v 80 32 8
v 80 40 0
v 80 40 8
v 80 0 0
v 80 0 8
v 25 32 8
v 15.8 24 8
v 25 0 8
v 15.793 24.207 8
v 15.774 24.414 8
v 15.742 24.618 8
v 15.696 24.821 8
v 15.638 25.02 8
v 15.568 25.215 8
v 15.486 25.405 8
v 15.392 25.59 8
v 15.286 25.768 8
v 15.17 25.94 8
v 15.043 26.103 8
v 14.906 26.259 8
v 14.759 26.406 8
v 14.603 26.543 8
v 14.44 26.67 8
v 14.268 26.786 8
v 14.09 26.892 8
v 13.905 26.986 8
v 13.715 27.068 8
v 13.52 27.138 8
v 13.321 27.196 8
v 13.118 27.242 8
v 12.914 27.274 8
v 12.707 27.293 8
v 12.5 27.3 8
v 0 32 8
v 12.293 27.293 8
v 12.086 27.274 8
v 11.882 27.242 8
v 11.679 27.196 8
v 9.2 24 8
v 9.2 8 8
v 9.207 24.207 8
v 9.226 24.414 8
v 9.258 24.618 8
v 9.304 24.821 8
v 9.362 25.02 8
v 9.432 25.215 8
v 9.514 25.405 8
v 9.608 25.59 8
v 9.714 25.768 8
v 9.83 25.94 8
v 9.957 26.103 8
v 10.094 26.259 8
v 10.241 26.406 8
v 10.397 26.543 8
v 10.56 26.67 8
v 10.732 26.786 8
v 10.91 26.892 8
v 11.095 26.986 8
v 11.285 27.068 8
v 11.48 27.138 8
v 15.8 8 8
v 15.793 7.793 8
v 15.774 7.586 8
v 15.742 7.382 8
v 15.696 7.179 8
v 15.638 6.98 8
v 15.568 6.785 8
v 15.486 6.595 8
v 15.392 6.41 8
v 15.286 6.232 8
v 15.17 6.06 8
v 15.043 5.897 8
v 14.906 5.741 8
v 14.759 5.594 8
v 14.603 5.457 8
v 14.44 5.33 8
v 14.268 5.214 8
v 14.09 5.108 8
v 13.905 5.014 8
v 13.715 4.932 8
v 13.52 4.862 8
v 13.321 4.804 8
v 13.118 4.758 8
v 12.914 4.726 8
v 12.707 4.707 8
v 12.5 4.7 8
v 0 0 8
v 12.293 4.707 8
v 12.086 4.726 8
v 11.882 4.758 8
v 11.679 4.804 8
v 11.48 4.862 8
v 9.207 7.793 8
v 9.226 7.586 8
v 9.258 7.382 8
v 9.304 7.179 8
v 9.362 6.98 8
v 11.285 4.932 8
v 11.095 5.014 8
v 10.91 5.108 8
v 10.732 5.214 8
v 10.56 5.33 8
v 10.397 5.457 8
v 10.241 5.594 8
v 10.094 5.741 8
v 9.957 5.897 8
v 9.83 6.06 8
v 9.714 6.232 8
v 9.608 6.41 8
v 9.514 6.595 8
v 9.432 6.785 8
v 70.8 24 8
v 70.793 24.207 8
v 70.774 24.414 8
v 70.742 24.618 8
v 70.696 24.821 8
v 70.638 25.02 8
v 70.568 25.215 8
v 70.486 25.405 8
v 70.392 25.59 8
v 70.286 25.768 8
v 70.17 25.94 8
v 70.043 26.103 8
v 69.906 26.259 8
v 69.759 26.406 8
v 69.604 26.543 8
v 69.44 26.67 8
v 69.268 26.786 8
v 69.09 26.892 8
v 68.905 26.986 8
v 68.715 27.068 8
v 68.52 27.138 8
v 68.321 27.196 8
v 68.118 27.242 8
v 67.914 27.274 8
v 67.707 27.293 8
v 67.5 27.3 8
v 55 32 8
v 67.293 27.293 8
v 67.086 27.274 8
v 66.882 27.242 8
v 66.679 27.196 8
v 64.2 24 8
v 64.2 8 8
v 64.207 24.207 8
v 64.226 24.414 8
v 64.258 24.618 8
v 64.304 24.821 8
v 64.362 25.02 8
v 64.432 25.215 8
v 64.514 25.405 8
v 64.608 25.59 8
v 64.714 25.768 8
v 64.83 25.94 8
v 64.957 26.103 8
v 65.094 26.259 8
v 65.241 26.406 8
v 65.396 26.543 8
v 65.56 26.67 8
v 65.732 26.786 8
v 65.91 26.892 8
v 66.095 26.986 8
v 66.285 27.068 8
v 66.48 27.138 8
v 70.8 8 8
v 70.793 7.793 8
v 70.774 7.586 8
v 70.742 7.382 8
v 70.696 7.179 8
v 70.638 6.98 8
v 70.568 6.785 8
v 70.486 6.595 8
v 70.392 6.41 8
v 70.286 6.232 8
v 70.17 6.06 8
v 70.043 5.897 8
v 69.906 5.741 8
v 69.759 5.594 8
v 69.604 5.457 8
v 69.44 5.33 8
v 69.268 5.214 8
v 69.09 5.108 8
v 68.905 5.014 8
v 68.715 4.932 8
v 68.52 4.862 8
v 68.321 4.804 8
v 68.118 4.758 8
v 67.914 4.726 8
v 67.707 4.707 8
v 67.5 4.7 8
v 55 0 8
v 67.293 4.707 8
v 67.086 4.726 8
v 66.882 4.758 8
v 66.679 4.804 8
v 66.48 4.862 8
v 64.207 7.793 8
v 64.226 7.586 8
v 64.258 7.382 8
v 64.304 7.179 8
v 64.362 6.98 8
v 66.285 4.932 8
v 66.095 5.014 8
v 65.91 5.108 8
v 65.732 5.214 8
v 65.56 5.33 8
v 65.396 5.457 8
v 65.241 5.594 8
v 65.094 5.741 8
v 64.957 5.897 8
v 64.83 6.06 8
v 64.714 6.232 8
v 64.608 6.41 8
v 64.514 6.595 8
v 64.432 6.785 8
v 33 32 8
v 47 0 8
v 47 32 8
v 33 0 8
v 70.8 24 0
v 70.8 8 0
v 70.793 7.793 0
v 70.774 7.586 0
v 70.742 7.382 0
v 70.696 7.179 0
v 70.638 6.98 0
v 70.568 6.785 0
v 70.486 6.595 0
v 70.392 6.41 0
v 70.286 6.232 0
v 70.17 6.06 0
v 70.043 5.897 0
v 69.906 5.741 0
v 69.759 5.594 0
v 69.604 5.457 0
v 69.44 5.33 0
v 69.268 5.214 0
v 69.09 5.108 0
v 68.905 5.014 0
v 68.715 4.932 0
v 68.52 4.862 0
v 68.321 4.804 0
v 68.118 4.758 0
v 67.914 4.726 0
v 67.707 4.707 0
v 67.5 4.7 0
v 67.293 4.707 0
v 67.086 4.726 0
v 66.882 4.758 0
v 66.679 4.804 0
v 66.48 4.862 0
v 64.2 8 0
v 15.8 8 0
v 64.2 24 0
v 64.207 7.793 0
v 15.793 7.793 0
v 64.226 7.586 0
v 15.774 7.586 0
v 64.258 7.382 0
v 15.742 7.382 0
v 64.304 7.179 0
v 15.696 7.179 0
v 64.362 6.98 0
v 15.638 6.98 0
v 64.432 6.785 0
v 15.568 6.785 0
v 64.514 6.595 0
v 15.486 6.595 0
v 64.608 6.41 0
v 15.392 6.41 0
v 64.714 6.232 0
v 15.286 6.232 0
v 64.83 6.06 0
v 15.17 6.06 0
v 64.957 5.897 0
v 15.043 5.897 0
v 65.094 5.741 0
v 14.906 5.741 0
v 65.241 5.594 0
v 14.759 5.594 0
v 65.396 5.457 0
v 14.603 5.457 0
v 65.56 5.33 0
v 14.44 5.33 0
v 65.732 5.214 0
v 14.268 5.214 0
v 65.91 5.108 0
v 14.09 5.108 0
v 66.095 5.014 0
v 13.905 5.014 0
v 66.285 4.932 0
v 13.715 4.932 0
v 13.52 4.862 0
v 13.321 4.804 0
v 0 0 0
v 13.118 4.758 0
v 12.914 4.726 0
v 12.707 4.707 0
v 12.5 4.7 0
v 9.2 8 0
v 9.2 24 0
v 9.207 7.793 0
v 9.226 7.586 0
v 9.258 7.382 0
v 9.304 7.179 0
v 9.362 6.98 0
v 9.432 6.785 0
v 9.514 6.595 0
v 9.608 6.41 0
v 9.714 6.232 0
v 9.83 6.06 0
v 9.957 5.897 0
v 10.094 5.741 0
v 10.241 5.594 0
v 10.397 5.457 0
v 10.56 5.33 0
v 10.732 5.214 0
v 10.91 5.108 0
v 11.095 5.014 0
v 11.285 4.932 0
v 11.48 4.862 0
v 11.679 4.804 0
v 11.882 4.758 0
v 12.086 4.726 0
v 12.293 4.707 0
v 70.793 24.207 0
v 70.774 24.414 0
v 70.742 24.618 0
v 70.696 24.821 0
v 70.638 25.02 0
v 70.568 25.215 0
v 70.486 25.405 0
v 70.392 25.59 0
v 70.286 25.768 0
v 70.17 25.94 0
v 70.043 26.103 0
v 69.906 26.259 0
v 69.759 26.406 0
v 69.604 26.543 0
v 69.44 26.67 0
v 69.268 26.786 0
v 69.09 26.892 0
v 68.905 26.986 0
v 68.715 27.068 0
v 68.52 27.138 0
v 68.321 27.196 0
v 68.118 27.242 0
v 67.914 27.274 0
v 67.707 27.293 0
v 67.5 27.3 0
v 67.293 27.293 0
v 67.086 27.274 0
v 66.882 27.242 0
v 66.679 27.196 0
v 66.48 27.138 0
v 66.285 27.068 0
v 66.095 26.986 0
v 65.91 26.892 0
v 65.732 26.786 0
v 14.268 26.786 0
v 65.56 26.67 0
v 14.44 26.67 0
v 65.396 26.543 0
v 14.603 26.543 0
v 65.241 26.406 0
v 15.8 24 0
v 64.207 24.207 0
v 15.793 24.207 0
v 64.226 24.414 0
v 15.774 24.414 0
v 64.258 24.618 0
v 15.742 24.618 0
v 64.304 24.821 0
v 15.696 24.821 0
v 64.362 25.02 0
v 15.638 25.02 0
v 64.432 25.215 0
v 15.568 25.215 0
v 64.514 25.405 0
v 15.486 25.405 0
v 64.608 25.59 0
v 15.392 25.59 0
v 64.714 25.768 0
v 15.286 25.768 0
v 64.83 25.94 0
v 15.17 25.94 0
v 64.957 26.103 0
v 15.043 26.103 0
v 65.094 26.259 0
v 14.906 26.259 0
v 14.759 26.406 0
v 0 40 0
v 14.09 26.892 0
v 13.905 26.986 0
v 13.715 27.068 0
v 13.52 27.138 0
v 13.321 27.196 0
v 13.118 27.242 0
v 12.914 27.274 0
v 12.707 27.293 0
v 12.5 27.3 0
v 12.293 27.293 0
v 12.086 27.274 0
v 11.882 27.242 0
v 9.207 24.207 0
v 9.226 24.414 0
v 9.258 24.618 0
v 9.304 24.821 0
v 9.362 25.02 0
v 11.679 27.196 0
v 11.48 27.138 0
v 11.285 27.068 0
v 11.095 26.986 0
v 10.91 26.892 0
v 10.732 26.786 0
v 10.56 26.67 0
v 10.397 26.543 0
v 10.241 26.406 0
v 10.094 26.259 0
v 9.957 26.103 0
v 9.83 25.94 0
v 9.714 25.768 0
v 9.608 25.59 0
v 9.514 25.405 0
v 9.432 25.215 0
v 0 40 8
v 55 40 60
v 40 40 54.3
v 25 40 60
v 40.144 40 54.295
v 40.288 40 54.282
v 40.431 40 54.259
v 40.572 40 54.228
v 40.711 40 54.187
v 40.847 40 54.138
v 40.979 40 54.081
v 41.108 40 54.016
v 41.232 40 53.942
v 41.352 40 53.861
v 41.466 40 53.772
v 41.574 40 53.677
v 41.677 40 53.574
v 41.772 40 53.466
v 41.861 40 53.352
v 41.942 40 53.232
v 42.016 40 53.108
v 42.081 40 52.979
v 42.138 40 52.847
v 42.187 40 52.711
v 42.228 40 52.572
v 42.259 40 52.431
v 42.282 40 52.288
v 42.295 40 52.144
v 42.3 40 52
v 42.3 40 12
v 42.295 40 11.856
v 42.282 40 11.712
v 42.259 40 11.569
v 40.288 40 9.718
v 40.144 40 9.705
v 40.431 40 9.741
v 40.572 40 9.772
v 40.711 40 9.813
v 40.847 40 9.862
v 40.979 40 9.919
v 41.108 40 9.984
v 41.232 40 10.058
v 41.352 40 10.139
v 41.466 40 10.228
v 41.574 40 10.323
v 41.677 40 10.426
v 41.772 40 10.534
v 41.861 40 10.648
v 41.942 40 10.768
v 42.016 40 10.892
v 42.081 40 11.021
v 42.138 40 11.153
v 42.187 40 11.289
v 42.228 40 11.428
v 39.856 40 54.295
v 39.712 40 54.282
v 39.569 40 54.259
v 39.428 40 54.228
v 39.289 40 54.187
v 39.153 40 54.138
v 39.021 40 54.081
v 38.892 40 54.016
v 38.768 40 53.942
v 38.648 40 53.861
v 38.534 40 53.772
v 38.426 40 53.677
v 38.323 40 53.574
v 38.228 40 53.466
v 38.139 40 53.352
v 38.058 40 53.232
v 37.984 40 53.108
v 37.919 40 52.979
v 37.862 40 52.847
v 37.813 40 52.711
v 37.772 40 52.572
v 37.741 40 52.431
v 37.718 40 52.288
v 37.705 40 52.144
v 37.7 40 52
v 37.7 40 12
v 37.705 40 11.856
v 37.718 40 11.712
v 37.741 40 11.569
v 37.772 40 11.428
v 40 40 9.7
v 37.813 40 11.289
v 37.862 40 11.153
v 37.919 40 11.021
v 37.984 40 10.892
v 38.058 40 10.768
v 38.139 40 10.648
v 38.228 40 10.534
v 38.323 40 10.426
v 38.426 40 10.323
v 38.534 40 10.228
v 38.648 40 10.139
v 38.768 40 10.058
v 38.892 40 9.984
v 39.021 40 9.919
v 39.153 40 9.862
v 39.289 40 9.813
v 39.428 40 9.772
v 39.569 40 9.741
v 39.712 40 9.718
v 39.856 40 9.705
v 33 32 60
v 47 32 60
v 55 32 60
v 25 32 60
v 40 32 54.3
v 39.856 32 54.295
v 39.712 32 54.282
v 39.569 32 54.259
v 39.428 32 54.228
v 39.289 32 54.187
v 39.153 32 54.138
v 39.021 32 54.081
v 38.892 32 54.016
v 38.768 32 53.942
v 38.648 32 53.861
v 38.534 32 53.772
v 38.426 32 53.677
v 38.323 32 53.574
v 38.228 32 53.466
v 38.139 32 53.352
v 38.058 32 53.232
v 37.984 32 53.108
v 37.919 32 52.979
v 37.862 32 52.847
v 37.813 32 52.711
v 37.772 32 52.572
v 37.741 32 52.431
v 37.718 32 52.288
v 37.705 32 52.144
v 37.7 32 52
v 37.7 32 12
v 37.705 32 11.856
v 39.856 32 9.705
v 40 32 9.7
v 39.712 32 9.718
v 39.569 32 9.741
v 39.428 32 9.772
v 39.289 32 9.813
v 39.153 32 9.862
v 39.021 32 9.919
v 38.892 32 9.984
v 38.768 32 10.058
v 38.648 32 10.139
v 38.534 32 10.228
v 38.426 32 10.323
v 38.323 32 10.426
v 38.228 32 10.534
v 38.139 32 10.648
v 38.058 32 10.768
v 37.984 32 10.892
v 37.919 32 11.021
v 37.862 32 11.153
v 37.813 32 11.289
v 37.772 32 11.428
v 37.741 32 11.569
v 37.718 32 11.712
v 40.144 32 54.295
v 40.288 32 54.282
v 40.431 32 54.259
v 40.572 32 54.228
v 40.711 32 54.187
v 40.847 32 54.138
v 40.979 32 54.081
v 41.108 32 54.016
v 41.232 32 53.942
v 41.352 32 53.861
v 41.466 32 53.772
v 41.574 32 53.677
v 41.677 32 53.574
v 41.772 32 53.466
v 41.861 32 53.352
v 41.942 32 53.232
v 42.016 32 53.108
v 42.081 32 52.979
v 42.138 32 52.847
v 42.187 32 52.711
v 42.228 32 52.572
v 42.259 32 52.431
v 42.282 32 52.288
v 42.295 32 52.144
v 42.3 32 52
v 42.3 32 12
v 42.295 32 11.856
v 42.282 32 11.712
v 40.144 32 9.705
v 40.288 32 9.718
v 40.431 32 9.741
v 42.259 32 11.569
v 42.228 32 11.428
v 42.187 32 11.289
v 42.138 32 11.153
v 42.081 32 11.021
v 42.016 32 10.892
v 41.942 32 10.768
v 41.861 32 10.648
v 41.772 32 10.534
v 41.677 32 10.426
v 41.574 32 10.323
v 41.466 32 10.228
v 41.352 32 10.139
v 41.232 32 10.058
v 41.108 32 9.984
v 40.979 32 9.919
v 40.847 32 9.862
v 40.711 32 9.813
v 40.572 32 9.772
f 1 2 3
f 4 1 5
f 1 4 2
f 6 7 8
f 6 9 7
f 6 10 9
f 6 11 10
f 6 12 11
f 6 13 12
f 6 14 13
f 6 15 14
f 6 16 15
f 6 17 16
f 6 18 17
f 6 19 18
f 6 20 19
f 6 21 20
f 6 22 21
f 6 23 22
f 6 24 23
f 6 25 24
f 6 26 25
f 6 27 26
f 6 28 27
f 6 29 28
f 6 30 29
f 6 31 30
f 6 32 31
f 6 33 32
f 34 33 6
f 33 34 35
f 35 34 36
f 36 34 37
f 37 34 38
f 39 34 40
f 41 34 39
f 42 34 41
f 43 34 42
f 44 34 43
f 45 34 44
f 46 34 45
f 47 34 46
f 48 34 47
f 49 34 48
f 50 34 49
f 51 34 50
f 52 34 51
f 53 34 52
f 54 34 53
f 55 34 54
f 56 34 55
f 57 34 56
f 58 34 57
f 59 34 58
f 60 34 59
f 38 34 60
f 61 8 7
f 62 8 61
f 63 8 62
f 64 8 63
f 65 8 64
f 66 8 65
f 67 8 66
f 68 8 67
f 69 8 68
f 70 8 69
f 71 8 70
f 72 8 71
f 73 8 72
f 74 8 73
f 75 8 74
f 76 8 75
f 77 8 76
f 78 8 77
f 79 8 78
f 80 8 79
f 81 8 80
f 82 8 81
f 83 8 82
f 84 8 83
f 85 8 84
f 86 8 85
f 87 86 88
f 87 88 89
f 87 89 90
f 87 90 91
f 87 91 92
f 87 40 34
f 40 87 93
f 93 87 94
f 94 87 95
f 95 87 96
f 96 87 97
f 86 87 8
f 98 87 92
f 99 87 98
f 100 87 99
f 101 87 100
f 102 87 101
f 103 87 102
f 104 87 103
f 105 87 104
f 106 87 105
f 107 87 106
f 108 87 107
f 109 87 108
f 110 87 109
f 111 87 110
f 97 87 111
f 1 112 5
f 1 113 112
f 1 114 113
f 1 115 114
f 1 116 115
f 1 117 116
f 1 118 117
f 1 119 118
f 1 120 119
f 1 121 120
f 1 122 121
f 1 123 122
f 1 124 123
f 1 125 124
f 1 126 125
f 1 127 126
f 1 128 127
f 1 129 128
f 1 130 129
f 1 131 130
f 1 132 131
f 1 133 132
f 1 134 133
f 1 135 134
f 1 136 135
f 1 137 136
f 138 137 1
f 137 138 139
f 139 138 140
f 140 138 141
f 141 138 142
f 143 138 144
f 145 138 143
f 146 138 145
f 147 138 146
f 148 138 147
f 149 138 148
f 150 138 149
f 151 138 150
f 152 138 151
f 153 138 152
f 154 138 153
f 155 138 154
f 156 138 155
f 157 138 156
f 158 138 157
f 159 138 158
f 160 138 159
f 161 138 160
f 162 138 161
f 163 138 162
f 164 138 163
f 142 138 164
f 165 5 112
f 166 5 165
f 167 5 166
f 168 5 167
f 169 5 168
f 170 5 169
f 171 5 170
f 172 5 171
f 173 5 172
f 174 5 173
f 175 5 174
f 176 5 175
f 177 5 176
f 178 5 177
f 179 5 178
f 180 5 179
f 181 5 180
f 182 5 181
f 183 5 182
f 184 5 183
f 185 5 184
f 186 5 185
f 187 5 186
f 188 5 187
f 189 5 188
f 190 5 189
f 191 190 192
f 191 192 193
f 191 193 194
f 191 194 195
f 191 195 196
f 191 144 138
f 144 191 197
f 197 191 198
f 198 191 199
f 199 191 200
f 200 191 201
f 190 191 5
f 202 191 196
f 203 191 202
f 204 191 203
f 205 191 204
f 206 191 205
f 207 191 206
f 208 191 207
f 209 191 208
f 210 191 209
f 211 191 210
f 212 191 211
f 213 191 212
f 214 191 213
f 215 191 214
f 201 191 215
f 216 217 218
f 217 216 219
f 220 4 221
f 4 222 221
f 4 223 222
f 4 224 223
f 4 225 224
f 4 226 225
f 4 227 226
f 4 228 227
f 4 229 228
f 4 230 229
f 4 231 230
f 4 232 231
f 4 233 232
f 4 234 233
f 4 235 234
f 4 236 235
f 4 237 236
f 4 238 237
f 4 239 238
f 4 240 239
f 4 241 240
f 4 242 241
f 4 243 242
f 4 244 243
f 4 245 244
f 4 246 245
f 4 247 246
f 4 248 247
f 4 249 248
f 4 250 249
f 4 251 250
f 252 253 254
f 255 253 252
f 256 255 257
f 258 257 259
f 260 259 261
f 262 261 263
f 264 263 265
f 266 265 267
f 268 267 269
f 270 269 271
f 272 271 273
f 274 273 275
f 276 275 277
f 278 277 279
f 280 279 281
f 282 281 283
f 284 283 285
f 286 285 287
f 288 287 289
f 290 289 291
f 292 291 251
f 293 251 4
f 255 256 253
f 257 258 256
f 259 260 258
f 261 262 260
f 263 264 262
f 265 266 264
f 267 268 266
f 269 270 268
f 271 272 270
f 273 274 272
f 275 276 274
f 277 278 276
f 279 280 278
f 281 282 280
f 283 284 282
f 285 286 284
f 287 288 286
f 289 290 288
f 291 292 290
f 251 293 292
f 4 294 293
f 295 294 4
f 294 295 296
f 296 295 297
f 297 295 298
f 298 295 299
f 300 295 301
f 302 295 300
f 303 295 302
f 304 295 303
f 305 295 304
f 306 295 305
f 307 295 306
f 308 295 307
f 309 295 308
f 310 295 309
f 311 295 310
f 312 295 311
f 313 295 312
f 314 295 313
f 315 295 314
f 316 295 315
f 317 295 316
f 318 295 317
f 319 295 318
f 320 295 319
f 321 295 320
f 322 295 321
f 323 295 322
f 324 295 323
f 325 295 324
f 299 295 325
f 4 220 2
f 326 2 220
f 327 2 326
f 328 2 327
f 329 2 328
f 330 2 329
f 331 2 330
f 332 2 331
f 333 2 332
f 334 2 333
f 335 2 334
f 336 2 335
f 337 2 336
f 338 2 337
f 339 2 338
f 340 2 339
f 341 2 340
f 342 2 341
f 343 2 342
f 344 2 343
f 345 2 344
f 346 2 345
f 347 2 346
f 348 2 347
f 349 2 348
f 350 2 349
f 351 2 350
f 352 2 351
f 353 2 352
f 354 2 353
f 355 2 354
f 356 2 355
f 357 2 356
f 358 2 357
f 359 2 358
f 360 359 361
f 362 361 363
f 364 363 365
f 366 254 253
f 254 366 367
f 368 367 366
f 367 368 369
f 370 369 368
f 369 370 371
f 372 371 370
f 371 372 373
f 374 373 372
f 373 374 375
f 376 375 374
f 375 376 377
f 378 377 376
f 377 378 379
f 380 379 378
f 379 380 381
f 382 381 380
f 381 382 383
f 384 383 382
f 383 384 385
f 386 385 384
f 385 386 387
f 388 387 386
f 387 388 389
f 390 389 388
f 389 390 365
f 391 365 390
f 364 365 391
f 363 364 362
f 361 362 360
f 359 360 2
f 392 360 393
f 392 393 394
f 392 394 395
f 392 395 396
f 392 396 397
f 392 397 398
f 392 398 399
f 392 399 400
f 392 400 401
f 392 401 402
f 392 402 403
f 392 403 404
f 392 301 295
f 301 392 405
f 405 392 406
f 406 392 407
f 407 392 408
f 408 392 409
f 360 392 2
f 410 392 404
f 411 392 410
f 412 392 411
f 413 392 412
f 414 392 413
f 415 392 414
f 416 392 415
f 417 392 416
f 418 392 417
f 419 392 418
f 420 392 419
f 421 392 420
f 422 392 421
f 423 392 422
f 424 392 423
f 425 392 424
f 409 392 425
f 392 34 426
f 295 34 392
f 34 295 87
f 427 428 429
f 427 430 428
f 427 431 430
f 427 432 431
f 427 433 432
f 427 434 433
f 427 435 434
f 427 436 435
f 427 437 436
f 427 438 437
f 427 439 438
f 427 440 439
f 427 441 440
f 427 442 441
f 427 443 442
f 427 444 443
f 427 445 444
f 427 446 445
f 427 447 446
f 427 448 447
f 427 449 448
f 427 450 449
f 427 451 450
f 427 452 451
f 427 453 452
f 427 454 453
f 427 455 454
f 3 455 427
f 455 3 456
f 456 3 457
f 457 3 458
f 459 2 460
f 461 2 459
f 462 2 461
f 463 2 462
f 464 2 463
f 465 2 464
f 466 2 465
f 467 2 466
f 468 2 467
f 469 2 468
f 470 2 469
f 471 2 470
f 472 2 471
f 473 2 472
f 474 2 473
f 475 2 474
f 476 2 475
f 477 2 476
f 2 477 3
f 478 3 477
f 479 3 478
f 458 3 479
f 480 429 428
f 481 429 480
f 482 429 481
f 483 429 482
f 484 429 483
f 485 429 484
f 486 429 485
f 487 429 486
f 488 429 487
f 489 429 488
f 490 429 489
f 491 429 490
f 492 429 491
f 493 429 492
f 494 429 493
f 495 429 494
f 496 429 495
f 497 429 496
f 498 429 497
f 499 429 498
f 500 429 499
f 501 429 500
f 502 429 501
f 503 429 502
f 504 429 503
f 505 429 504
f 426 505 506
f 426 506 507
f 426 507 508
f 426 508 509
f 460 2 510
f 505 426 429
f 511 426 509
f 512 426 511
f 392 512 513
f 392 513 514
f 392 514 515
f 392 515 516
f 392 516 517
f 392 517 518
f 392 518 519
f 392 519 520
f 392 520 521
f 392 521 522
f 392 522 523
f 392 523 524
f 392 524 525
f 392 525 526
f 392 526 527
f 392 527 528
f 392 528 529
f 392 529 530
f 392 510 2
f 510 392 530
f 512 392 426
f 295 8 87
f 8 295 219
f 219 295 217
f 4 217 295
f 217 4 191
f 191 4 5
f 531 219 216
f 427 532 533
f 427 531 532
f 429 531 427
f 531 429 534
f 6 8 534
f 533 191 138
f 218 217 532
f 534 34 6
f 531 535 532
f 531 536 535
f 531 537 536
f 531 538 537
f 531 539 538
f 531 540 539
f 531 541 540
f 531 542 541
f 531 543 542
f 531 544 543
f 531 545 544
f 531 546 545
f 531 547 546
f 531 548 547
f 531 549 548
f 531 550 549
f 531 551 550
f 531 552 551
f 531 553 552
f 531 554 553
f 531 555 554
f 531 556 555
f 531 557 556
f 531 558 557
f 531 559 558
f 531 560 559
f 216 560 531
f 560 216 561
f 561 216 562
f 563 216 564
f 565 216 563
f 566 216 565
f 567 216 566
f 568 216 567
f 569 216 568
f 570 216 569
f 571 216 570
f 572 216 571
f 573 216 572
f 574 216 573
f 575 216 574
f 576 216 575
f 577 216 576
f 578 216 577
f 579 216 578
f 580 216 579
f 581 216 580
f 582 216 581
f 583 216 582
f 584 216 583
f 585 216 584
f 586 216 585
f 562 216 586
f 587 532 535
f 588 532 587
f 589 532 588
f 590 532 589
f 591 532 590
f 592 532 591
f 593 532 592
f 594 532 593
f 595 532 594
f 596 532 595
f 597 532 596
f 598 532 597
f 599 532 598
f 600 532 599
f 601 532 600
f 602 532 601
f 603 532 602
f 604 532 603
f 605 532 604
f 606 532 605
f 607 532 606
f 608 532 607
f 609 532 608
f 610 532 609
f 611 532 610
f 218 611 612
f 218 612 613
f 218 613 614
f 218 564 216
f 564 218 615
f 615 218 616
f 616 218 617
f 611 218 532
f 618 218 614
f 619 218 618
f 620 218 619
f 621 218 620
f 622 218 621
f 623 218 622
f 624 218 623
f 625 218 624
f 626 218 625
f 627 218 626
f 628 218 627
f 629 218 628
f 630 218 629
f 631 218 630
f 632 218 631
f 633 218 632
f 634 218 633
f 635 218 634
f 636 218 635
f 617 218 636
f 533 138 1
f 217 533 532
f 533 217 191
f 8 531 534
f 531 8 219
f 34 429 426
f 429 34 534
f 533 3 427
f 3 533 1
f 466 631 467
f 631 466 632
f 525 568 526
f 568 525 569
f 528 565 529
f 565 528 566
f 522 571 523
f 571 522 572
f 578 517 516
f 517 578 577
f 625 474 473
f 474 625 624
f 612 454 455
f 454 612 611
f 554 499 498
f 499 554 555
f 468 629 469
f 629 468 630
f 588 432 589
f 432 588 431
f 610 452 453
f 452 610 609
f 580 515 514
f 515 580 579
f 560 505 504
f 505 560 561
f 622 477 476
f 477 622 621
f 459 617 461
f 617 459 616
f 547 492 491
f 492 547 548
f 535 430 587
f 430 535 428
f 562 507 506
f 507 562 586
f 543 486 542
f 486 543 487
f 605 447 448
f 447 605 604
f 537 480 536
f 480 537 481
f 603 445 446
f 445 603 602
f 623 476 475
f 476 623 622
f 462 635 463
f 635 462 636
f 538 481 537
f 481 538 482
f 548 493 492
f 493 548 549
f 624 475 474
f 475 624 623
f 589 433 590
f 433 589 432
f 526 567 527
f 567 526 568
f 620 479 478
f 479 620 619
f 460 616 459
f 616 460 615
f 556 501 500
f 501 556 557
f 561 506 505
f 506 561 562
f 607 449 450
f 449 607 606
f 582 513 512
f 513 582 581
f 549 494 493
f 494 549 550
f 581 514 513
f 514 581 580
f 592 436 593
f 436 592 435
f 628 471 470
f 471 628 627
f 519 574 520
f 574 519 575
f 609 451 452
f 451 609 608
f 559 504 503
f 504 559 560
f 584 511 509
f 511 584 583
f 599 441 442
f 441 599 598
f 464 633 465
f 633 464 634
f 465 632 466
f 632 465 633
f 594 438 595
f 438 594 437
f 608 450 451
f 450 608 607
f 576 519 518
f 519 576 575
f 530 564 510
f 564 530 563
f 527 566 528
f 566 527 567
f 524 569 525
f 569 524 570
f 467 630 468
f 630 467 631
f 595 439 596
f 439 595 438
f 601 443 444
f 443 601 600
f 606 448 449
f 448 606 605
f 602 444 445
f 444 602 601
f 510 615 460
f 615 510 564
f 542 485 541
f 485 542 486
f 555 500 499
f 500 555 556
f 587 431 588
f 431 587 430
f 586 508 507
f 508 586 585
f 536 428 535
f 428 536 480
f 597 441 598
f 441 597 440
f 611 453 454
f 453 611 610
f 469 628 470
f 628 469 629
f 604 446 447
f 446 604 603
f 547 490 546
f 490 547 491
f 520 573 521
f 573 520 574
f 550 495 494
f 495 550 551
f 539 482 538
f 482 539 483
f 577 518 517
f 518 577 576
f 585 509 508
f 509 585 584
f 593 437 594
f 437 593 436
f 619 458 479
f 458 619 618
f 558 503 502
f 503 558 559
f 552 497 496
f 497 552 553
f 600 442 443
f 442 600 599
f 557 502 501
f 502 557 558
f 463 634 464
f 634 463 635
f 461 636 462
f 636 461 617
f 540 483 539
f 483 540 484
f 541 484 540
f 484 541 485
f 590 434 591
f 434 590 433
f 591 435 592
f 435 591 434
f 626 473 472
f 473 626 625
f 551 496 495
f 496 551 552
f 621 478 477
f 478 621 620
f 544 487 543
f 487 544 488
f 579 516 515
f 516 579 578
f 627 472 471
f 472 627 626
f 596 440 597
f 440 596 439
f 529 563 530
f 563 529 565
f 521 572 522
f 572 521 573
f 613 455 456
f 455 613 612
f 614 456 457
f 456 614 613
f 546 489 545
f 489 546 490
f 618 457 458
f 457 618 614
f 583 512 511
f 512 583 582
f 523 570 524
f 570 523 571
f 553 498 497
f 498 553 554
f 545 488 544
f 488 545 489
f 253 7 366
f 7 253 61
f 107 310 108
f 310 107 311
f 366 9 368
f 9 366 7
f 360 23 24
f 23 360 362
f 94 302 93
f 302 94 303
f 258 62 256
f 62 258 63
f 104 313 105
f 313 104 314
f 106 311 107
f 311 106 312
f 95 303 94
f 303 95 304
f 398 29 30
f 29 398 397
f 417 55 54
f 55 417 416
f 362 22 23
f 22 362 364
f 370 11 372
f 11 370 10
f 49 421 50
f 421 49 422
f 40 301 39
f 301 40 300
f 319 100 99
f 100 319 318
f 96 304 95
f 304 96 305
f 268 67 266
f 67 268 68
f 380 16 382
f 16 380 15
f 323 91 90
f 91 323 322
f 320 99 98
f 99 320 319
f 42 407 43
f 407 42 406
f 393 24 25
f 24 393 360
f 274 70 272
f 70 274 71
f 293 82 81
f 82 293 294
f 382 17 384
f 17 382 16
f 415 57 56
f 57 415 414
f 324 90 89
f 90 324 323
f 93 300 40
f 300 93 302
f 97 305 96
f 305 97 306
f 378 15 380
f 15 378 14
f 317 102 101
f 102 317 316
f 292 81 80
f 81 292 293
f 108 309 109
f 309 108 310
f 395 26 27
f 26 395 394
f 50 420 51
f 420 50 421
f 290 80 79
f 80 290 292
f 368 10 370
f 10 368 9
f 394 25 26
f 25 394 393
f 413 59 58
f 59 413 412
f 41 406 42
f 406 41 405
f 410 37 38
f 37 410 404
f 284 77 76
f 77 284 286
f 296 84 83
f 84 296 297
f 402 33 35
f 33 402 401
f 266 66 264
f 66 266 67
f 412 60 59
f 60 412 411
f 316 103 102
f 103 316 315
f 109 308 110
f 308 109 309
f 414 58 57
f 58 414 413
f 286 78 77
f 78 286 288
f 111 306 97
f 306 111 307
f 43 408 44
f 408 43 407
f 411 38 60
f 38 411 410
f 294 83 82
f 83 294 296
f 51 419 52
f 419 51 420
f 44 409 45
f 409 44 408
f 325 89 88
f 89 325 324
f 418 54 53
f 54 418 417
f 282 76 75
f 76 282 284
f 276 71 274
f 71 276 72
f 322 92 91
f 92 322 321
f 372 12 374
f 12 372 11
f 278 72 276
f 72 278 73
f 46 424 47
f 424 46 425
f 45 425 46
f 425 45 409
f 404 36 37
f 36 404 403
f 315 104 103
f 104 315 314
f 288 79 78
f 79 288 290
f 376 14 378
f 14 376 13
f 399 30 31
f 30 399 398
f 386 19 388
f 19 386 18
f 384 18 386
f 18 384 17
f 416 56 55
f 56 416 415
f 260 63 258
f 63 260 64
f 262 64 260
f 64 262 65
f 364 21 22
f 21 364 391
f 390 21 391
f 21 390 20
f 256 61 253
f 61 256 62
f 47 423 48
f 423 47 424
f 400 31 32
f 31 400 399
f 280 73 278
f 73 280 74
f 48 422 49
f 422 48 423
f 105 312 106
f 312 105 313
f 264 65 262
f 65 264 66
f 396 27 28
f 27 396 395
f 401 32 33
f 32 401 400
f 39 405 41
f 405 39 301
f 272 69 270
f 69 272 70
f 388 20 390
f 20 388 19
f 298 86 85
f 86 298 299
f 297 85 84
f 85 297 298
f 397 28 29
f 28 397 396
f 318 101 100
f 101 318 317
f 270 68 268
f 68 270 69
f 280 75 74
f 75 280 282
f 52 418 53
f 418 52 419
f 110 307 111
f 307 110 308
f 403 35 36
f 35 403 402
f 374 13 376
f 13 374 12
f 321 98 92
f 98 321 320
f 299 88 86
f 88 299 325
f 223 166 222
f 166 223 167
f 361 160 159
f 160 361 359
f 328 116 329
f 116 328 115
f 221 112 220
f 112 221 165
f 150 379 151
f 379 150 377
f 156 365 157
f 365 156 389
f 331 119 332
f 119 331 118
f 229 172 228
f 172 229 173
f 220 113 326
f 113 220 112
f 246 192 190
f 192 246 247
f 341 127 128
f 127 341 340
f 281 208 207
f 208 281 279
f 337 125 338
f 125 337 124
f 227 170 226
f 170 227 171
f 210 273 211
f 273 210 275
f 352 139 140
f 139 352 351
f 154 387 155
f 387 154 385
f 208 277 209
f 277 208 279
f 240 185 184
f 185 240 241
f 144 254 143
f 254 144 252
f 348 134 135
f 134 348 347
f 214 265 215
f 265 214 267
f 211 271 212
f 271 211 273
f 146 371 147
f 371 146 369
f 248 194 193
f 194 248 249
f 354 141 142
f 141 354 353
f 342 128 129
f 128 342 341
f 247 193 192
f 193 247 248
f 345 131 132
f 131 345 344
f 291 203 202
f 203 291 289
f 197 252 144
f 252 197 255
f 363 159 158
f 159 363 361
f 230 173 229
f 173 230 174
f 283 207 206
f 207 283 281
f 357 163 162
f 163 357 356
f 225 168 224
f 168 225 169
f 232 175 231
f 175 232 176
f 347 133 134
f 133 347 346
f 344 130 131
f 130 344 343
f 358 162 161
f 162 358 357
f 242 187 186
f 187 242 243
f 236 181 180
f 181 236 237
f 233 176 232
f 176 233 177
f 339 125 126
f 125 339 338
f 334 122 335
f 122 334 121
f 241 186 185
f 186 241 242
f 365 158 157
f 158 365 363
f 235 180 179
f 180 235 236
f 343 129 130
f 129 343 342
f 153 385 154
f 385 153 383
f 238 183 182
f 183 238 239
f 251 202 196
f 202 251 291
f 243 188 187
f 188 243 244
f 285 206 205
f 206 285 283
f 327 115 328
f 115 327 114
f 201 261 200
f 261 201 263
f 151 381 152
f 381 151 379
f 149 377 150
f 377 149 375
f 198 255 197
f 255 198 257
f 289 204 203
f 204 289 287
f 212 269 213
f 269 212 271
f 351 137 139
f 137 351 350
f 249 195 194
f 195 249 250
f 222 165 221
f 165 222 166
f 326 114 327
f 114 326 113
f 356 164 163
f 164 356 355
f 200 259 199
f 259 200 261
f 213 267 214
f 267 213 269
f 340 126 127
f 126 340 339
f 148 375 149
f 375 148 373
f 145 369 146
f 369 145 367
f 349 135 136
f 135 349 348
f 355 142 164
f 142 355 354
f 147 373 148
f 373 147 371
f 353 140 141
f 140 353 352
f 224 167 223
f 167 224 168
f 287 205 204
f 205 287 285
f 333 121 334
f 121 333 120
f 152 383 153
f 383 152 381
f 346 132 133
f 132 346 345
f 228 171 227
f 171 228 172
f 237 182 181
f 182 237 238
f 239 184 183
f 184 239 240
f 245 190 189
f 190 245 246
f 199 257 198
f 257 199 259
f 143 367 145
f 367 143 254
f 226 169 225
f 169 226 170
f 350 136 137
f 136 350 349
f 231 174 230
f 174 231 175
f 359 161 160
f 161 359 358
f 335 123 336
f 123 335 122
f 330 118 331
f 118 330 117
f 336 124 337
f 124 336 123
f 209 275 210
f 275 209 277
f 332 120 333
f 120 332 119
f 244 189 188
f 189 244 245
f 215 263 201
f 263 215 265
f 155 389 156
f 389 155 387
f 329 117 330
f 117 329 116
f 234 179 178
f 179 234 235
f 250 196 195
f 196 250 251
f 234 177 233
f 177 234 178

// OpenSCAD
$fn=100;

loose_slack = 0.3;
tight_slack = 0.1;

mat_width = 30;
mat_thickness = 5;
mat_fixation_hole_diameter = 4;
mat_base_fixation_hole_diameter = 6;

mat_holder_thickness = 8;
mat_holder_width = 80;
mat_holder_depth = 40;
mat_holder_height = 60;

module mat_holder_base() {
    cube([mat_holder_width, mat_holder_depth, mat_holder_thickness]);
    
    translate([mat_holder_width/2 - mat_width/2, 0, 0])
        cube([mat_holder_thickness, mat_holder_depth, mat_holder_height]);
    translate([mat_holder_width/2 + mat_width/2 - mat_holder_thickness, 0, 0])
        cube([mat_holder_thickness, mat_holder_depth, mat_holder_height]);
    
    translate([0, mat_holder_depth - mat_holder_thickness, 0])
        cube([mat_holder_width, mat_holder_thickness, mat_holder_height]);
}

module negative_side_profile() {
    rotate([90, 0, 0])
    rotate([0, 90, 0])
        linear_extrude(height = mat_holder_width + 2)
            polygon(points=[[0, mat_holder_thickness], [mat_holder_depth - mat_holder_thickness, mat_holder_height], [mat_holder_depth - mat_holder_thickness, mat_holder_height + 1], [-1, mat_holder_height + 1], [-1, mat_holder_thickness]]);
}

module negative_front_profile() {
    mirror([0,1,0])
        rotate([90, 0, 0])
            linear_extrude(height = mat_holder_depth + 2)
                polygon(points=[[0, mat_holder_thickness], [mat_holder_width/2 - mat_width/2, mat_holder_height], [mat_holder_width/2 - mat_width/2, mat_holder_height + 1], [-1, mat_holder_height + 1], [-1, mat_holder_thickness]]);
}

module base_fixation_holes() {
    hull() {
        translate([0, mat_holder_thickness, -1])
            cylinder(d=mat_base_fixation_hole_diameter + 2*loose_slack, h=mat_holder_thickness+2);
            
        translate([0, mat_holder_depth - 2*mat_holder_thickness, -1])
            cylinder(d=mat_base_fixation_hole_diameter + 2*loose_slack, h=mat_holder_thickness+2);
    }
}

module mat_holder() {
    difference() {
        mat_holder_base();

        // Profile the holder
        negative_side_profile();
        negative_front_profile();        
        translate([mat_holder_width, 0, 0])
            mirror([1,0,0])
                negative_front_profile();
        
        // mat fixation holes
        hull() {
            translate([mat_holder_width/2, -1, mat_holder_thickness + mat_fixation_hole_diameter]) {
                rotate([-90, 0, 0])
                    cylinder(d=mat_fixation_hole_diameter+2*loose_slack, h=mat_holder_depth+2);
            
                translate([0, 0, mat_holder_height - 2*mat_holder_thickness - mat_fixation_hole_diameter])
                    rotate([-90, 0, 0])
                        cylinder(d=mat_fixation_hole_diameter+2*loose_slack, h=mat_holder_depth+2);
            }
        }
        
        // base fixation holes
        translate([(mat_holder_width/2 - mat_width/2)/2, 0, 0])
            base_fixation_holes();
        
        translate([mat_holder_width - (mat_holder_width/2 - mat_width/2)/2, 0, 0])
        base_fixation_holes();
    }
}

mat_holder();
